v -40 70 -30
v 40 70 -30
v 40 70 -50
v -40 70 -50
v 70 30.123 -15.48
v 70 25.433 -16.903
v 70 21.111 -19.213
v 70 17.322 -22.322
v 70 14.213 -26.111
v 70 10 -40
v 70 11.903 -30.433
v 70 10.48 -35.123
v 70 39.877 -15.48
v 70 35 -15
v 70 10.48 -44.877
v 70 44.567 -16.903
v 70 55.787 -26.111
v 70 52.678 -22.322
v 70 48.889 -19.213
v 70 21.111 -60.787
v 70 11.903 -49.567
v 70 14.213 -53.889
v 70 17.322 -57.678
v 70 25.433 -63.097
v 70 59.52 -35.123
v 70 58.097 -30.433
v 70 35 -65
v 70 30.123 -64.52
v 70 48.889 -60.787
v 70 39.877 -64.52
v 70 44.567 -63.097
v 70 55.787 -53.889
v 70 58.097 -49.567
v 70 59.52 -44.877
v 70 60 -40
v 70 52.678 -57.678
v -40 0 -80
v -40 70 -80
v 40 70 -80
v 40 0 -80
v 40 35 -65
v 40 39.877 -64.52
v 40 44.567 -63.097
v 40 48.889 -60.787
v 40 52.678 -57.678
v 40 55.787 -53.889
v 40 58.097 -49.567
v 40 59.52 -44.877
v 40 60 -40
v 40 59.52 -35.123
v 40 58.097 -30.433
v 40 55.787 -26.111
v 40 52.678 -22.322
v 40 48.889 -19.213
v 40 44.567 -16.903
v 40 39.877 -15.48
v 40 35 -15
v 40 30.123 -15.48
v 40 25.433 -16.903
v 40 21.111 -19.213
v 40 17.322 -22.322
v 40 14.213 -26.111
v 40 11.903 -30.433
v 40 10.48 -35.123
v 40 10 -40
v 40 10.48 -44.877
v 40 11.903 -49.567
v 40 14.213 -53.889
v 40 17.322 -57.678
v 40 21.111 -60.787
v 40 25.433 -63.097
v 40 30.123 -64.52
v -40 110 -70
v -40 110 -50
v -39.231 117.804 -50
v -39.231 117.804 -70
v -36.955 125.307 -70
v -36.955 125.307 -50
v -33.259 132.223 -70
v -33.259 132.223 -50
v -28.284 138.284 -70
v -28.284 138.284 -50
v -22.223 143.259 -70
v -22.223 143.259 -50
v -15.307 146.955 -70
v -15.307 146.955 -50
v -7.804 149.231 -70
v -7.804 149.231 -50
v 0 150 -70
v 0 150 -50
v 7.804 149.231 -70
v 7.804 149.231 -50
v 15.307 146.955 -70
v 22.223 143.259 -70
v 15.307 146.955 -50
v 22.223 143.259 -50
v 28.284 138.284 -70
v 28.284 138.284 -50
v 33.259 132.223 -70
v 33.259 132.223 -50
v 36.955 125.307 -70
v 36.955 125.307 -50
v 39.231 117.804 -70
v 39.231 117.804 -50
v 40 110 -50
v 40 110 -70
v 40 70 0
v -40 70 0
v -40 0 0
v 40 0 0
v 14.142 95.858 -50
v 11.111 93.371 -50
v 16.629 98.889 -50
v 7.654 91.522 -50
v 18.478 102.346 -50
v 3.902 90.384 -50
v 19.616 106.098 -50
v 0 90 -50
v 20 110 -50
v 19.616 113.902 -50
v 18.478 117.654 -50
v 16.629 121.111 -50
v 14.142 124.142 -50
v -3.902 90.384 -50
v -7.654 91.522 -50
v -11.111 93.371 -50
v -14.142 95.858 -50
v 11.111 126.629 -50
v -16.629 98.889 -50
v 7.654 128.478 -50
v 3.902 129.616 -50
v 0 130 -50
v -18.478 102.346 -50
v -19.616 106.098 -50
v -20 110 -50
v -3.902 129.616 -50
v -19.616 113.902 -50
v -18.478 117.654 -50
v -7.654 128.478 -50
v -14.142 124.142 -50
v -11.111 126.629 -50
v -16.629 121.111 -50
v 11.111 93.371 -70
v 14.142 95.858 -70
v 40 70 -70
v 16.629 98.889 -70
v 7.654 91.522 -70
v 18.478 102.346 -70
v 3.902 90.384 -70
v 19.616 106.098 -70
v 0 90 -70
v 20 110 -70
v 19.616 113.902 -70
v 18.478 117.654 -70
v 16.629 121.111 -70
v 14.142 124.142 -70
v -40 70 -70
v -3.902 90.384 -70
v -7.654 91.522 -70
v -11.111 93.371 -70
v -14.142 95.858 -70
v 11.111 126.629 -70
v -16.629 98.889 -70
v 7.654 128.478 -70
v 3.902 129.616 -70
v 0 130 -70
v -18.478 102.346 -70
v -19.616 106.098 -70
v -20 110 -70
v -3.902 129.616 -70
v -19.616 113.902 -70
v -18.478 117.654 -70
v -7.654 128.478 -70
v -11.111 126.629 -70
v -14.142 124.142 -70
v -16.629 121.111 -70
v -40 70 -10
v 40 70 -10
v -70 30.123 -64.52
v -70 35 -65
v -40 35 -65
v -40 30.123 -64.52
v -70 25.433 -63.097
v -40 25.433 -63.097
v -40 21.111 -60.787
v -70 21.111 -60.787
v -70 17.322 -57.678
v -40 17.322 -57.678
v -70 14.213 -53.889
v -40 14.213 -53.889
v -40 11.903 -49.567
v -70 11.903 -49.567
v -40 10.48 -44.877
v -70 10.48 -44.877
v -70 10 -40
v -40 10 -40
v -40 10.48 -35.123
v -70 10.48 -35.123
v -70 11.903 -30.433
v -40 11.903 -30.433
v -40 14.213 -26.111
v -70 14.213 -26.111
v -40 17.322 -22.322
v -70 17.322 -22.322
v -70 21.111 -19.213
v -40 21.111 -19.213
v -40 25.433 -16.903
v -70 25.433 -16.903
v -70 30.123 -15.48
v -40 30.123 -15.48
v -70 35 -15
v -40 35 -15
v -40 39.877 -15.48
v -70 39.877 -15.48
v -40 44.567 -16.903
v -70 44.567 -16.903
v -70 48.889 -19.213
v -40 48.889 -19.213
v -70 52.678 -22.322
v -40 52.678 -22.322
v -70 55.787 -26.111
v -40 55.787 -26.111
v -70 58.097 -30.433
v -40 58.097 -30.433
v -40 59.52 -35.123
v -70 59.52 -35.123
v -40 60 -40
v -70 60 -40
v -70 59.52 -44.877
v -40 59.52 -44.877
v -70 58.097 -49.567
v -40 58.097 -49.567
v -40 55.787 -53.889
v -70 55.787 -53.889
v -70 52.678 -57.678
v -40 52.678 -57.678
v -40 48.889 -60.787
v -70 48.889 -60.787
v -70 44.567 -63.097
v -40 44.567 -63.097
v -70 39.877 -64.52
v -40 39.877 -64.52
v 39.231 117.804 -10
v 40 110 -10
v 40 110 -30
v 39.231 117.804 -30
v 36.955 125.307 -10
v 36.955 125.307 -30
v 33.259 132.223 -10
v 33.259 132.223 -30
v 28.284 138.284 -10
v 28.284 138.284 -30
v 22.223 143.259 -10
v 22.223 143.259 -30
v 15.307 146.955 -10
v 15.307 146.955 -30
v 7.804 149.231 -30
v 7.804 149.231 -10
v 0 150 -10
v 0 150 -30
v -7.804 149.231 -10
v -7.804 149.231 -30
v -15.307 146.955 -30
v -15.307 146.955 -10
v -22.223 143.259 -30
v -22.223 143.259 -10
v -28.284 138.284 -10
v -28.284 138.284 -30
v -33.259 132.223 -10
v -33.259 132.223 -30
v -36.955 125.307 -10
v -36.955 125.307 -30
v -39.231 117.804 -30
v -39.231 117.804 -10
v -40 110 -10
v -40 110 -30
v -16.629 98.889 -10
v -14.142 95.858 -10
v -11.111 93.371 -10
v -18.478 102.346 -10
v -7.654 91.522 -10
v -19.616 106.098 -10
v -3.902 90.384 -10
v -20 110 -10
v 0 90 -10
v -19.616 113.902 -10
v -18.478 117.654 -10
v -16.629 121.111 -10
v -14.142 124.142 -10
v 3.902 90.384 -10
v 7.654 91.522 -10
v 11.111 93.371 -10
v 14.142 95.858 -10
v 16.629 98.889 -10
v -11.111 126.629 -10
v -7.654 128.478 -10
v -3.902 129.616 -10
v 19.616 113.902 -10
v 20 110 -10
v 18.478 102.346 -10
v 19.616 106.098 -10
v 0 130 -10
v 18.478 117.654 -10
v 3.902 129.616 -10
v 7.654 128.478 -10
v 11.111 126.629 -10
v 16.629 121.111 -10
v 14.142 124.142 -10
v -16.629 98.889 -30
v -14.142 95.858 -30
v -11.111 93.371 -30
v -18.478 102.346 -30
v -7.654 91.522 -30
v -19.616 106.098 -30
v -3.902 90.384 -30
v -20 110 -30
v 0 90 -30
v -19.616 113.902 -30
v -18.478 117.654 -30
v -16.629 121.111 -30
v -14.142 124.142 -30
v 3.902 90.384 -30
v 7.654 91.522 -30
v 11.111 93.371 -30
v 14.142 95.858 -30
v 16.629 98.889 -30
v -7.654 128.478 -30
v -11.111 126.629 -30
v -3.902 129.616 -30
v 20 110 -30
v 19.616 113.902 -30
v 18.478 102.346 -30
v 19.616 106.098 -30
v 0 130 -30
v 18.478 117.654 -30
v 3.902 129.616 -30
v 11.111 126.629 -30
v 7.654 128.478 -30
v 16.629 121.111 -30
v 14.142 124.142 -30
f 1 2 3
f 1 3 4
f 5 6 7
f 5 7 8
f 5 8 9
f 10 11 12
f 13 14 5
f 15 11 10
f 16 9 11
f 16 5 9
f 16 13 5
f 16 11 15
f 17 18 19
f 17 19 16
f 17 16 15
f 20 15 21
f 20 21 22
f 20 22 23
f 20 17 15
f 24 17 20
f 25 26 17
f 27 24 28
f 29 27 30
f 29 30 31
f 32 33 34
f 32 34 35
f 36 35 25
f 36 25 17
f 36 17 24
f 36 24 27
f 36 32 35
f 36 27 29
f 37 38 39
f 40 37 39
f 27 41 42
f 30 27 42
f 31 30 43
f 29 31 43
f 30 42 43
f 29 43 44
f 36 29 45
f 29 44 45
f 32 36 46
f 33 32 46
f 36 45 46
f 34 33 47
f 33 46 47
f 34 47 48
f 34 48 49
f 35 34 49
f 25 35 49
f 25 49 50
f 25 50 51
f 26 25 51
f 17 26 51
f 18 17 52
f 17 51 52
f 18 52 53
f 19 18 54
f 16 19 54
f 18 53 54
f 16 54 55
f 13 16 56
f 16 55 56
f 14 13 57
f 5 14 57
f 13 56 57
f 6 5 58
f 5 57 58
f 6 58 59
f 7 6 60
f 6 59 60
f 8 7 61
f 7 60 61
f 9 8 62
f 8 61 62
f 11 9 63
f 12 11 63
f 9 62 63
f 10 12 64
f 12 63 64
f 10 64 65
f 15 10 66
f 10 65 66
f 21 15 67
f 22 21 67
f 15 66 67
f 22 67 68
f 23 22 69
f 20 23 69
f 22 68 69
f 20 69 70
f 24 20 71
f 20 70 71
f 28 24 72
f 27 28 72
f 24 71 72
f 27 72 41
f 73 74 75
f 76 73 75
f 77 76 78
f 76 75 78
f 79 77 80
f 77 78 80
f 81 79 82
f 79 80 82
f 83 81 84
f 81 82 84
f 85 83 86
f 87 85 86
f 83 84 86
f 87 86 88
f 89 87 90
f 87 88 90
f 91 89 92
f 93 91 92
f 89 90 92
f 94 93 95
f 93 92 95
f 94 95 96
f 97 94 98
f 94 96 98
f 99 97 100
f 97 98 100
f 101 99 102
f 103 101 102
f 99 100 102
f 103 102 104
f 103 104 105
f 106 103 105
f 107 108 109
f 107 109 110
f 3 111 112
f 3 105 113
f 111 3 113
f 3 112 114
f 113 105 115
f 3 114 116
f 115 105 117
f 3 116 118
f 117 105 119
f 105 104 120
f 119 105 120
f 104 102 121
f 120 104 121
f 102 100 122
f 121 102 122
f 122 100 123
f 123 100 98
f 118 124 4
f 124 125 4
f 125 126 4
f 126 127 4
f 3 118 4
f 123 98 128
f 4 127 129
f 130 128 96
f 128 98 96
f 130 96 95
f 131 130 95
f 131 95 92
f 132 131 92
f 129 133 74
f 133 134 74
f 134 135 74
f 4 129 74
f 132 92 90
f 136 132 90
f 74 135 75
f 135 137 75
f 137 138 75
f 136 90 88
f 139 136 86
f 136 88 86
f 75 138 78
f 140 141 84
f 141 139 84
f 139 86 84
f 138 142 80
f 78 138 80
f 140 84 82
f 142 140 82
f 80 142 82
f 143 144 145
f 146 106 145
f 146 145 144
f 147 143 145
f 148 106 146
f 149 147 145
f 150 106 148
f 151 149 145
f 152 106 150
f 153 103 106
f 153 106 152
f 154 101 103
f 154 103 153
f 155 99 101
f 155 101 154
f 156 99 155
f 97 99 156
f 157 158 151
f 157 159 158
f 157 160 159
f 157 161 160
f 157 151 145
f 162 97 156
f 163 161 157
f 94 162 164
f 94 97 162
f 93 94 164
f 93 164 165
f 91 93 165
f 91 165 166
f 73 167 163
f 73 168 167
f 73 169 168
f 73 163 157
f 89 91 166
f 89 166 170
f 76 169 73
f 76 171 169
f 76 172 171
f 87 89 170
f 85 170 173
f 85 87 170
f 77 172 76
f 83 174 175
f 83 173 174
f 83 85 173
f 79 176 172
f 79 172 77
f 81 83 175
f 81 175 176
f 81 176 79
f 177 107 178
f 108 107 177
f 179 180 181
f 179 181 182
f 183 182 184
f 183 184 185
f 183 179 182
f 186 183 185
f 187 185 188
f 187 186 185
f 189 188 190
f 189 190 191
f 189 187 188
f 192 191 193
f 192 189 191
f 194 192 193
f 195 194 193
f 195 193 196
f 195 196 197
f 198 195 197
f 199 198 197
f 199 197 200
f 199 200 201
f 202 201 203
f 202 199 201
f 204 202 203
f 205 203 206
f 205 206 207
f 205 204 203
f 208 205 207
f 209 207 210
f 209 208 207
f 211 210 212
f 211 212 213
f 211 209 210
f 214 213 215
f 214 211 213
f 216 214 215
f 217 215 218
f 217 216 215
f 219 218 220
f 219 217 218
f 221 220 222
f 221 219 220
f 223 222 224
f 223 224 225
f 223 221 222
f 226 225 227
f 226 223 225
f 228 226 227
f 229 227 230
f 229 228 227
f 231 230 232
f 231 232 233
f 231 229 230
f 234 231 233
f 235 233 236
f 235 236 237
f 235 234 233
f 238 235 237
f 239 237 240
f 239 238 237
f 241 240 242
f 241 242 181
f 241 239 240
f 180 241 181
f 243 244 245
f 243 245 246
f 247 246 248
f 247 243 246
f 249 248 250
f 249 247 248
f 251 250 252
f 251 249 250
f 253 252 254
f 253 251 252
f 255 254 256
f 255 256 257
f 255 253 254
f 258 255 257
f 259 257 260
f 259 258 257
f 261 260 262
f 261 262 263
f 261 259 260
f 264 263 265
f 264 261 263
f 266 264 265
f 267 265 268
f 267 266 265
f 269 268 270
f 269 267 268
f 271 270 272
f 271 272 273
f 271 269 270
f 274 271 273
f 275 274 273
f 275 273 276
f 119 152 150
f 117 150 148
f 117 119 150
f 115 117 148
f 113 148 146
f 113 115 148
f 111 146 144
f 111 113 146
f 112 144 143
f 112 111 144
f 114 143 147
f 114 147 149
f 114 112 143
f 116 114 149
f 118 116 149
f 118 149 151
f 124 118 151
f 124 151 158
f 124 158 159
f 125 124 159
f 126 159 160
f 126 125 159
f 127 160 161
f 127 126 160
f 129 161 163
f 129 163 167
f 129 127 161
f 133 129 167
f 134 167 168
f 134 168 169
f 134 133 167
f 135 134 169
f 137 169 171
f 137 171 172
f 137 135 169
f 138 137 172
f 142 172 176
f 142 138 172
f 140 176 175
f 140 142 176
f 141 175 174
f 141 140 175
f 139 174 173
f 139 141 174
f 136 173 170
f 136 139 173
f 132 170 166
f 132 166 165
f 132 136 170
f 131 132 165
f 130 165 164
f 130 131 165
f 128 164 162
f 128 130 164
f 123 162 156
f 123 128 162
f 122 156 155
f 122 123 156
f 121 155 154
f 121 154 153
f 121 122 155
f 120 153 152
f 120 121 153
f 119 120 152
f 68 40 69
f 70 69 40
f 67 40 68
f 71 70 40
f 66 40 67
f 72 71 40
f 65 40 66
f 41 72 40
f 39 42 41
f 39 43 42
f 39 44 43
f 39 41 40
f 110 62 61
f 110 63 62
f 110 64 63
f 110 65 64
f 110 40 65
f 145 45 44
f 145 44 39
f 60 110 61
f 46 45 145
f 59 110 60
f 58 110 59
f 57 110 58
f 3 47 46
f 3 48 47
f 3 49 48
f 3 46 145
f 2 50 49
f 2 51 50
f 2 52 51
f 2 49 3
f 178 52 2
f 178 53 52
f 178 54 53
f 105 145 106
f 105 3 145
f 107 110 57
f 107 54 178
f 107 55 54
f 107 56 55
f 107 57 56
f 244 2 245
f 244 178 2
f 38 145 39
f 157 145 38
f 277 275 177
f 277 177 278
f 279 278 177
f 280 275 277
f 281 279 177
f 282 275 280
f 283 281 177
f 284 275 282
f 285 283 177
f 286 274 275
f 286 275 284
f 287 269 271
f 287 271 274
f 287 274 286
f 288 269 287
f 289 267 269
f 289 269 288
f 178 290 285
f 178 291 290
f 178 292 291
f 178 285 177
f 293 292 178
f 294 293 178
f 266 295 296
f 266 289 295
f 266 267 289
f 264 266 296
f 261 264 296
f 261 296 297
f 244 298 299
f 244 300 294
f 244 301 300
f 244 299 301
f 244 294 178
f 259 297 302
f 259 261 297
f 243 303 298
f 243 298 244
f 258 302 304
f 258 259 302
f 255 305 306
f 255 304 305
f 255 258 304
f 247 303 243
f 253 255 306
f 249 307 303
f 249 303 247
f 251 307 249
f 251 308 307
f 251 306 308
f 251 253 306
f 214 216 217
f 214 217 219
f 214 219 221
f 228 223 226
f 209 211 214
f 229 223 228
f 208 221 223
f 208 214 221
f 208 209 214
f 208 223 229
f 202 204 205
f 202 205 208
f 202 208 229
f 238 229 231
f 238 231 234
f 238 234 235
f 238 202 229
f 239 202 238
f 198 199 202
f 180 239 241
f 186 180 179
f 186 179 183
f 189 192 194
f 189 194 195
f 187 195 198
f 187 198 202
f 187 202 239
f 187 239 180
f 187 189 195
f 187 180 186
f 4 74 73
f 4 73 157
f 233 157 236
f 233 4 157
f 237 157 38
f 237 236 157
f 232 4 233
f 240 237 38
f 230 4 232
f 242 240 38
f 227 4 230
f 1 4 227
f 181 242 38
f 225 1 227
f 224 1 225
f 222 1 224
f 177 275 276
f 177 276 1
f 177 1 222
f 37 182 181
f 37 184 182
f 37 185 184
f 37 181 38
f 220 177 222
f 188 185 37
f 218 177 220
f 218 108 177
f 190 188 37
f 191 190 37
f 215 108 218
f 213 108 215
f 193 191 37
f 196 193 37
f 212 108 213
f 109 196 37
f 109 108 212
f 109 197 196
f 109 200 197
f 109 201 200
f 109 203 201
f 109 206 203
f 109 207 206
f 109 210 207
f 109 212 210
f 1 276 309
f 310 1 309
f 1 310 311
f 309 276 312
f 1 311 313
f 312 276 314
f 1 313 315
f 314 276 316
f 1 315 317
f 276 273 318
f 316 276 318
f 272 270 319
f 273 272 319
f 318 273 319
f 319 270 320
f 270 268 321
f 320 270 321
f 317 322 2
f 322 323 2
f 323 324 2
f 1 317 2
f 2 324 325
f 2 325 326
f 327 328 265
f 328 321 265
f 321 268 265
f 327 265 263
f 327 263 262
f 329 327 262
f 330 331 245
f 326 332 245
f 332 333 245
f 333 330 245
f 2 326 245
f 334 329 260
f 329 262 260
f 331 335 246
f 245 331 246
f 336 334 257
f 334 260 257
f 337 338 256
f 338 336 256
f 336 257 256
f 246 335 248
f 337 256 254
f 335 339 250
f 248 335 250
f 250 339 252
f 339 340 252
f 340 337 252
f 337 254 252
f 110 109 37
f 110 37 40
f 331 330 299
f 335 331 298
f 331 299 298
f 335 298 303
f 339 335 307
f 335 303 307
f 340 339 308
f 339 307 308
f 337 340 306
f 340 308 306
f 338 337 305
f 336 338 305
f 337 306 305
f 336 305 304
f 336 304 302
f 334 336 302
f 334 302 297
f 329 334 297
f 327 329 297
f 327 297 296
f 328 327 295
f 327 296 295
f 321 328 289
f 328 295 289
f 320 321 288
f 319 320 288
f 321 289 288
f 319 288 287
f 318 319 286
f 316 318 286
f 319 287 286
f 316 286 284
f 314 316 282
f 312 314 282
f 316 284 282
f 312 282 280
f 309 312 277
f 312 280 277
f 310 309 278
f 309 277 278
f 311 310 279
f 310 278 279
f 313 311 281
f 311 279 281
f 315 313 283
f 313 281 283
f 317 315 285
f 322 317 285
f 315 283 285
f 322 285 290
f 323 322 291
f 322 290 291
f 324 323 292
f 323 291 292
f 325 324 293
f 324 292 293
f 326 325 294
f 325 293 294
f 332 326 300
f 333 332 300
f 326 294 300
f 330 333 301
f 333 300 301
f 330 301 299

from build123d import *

# Parameters (mm, degrees)
SALIENTE_EXTRUIR1_DEPTH = 80
CROQUIS2_R              = 25
SALIENTE_EXTRUIR2_DEPTH = 30
SALIENTE_EXTRUIR3_START = 30
CROQUIS3_R              = 25
SALIENTE_EXTRUIR3_DEPTH = 30
CROQUIS4_R              = 20
SALIENTE_EXTRUIR5_DEPTH = 20
SALIENTE_EXTRUIR6_START = -20
CROQUIS5_R              = 20
SALIENTE_EXTRUIR6_DEPTH = 20


with BuildPart() as part:
    # Croquis1 → Saliente-Extruir1 (new body)
    with BuildSketch(Plane.XY):
        Polygon((0, 0), (40, 0), (40, 70), (-40, 70), (-40, 0), align=None)
    extrude(amount=-SALIENTE_EXTRUIR1_DEPTH)

    # Croquis2 → Saliente-Extruir2 (add)
    with BuildSketch(Plane(origin=(40, 0, 0), x_dir=(0, 0, -1), z_dir=(1, 0, 0))):
        with Locations((40, 35)):
            Circle(CROQUIS2_R)
    extrude(amount=SALIENTE_EXTRUIR2_DEPTH)

    # Croquis3 → Saliente-Extruir3 (add)
    with BuildSketch(Plane.ZY.offset(40).offset(SALIENTE_EXTRUIR3_START)):
        with Locations(Location((-40, 35, 0), (0, 0, 180))):
            Circle(CROQUIS3_R)
    extrude(amount=-SALIENTE_EXTRUIR3_DEPTH)

    # Croquis4 → Saliente-Extruir5 (add)
    with BuildSketch(Plane.XY.offset(-10)):
        with BuildLine():
            Line((-40, 110), (-40, 70))
            Line((-40, 70), (0, 70))
            Line((0, 70), (40, 70))
            Line((40, 70), (40, 110))
            ThreePointArc((40, 110), (0, 150), (-40, 110))
        make_face()
        with Locations((0, 110)):
            Circle(CROQUIS4_R, mode=Mode.SUBTRACT)
    extrude(amount=-SALIENTE_EXTRUIR5_DEPTH)

    # Croquis5 → Saliente-Extruir6 (add)
    with BuildSketch(Plane(origin=(0, 0, -70), x_dir=(-1, 0, 0), z_dir=(0, 0, -1)).offset(SALIENTE_EXTRUIR6_START)):
        with BuildLine():
            Line((-40, 110), (-40, 70))
            Line((-40, 70), (40, 70))
            Line((40, 70), (40, 110))
            ThreePointArc((40, 110), (0, 150), (-40, 110))
        make_face()
        with Locations(Location((0, 110, 0), (0, 0, 180))):
            Circle(CROQUIS5_R, mode=Mode.SUBTRACT)
    extrude(amount=SALIENTE_EXTRUIR6_DEPTH)


solid = part.part
